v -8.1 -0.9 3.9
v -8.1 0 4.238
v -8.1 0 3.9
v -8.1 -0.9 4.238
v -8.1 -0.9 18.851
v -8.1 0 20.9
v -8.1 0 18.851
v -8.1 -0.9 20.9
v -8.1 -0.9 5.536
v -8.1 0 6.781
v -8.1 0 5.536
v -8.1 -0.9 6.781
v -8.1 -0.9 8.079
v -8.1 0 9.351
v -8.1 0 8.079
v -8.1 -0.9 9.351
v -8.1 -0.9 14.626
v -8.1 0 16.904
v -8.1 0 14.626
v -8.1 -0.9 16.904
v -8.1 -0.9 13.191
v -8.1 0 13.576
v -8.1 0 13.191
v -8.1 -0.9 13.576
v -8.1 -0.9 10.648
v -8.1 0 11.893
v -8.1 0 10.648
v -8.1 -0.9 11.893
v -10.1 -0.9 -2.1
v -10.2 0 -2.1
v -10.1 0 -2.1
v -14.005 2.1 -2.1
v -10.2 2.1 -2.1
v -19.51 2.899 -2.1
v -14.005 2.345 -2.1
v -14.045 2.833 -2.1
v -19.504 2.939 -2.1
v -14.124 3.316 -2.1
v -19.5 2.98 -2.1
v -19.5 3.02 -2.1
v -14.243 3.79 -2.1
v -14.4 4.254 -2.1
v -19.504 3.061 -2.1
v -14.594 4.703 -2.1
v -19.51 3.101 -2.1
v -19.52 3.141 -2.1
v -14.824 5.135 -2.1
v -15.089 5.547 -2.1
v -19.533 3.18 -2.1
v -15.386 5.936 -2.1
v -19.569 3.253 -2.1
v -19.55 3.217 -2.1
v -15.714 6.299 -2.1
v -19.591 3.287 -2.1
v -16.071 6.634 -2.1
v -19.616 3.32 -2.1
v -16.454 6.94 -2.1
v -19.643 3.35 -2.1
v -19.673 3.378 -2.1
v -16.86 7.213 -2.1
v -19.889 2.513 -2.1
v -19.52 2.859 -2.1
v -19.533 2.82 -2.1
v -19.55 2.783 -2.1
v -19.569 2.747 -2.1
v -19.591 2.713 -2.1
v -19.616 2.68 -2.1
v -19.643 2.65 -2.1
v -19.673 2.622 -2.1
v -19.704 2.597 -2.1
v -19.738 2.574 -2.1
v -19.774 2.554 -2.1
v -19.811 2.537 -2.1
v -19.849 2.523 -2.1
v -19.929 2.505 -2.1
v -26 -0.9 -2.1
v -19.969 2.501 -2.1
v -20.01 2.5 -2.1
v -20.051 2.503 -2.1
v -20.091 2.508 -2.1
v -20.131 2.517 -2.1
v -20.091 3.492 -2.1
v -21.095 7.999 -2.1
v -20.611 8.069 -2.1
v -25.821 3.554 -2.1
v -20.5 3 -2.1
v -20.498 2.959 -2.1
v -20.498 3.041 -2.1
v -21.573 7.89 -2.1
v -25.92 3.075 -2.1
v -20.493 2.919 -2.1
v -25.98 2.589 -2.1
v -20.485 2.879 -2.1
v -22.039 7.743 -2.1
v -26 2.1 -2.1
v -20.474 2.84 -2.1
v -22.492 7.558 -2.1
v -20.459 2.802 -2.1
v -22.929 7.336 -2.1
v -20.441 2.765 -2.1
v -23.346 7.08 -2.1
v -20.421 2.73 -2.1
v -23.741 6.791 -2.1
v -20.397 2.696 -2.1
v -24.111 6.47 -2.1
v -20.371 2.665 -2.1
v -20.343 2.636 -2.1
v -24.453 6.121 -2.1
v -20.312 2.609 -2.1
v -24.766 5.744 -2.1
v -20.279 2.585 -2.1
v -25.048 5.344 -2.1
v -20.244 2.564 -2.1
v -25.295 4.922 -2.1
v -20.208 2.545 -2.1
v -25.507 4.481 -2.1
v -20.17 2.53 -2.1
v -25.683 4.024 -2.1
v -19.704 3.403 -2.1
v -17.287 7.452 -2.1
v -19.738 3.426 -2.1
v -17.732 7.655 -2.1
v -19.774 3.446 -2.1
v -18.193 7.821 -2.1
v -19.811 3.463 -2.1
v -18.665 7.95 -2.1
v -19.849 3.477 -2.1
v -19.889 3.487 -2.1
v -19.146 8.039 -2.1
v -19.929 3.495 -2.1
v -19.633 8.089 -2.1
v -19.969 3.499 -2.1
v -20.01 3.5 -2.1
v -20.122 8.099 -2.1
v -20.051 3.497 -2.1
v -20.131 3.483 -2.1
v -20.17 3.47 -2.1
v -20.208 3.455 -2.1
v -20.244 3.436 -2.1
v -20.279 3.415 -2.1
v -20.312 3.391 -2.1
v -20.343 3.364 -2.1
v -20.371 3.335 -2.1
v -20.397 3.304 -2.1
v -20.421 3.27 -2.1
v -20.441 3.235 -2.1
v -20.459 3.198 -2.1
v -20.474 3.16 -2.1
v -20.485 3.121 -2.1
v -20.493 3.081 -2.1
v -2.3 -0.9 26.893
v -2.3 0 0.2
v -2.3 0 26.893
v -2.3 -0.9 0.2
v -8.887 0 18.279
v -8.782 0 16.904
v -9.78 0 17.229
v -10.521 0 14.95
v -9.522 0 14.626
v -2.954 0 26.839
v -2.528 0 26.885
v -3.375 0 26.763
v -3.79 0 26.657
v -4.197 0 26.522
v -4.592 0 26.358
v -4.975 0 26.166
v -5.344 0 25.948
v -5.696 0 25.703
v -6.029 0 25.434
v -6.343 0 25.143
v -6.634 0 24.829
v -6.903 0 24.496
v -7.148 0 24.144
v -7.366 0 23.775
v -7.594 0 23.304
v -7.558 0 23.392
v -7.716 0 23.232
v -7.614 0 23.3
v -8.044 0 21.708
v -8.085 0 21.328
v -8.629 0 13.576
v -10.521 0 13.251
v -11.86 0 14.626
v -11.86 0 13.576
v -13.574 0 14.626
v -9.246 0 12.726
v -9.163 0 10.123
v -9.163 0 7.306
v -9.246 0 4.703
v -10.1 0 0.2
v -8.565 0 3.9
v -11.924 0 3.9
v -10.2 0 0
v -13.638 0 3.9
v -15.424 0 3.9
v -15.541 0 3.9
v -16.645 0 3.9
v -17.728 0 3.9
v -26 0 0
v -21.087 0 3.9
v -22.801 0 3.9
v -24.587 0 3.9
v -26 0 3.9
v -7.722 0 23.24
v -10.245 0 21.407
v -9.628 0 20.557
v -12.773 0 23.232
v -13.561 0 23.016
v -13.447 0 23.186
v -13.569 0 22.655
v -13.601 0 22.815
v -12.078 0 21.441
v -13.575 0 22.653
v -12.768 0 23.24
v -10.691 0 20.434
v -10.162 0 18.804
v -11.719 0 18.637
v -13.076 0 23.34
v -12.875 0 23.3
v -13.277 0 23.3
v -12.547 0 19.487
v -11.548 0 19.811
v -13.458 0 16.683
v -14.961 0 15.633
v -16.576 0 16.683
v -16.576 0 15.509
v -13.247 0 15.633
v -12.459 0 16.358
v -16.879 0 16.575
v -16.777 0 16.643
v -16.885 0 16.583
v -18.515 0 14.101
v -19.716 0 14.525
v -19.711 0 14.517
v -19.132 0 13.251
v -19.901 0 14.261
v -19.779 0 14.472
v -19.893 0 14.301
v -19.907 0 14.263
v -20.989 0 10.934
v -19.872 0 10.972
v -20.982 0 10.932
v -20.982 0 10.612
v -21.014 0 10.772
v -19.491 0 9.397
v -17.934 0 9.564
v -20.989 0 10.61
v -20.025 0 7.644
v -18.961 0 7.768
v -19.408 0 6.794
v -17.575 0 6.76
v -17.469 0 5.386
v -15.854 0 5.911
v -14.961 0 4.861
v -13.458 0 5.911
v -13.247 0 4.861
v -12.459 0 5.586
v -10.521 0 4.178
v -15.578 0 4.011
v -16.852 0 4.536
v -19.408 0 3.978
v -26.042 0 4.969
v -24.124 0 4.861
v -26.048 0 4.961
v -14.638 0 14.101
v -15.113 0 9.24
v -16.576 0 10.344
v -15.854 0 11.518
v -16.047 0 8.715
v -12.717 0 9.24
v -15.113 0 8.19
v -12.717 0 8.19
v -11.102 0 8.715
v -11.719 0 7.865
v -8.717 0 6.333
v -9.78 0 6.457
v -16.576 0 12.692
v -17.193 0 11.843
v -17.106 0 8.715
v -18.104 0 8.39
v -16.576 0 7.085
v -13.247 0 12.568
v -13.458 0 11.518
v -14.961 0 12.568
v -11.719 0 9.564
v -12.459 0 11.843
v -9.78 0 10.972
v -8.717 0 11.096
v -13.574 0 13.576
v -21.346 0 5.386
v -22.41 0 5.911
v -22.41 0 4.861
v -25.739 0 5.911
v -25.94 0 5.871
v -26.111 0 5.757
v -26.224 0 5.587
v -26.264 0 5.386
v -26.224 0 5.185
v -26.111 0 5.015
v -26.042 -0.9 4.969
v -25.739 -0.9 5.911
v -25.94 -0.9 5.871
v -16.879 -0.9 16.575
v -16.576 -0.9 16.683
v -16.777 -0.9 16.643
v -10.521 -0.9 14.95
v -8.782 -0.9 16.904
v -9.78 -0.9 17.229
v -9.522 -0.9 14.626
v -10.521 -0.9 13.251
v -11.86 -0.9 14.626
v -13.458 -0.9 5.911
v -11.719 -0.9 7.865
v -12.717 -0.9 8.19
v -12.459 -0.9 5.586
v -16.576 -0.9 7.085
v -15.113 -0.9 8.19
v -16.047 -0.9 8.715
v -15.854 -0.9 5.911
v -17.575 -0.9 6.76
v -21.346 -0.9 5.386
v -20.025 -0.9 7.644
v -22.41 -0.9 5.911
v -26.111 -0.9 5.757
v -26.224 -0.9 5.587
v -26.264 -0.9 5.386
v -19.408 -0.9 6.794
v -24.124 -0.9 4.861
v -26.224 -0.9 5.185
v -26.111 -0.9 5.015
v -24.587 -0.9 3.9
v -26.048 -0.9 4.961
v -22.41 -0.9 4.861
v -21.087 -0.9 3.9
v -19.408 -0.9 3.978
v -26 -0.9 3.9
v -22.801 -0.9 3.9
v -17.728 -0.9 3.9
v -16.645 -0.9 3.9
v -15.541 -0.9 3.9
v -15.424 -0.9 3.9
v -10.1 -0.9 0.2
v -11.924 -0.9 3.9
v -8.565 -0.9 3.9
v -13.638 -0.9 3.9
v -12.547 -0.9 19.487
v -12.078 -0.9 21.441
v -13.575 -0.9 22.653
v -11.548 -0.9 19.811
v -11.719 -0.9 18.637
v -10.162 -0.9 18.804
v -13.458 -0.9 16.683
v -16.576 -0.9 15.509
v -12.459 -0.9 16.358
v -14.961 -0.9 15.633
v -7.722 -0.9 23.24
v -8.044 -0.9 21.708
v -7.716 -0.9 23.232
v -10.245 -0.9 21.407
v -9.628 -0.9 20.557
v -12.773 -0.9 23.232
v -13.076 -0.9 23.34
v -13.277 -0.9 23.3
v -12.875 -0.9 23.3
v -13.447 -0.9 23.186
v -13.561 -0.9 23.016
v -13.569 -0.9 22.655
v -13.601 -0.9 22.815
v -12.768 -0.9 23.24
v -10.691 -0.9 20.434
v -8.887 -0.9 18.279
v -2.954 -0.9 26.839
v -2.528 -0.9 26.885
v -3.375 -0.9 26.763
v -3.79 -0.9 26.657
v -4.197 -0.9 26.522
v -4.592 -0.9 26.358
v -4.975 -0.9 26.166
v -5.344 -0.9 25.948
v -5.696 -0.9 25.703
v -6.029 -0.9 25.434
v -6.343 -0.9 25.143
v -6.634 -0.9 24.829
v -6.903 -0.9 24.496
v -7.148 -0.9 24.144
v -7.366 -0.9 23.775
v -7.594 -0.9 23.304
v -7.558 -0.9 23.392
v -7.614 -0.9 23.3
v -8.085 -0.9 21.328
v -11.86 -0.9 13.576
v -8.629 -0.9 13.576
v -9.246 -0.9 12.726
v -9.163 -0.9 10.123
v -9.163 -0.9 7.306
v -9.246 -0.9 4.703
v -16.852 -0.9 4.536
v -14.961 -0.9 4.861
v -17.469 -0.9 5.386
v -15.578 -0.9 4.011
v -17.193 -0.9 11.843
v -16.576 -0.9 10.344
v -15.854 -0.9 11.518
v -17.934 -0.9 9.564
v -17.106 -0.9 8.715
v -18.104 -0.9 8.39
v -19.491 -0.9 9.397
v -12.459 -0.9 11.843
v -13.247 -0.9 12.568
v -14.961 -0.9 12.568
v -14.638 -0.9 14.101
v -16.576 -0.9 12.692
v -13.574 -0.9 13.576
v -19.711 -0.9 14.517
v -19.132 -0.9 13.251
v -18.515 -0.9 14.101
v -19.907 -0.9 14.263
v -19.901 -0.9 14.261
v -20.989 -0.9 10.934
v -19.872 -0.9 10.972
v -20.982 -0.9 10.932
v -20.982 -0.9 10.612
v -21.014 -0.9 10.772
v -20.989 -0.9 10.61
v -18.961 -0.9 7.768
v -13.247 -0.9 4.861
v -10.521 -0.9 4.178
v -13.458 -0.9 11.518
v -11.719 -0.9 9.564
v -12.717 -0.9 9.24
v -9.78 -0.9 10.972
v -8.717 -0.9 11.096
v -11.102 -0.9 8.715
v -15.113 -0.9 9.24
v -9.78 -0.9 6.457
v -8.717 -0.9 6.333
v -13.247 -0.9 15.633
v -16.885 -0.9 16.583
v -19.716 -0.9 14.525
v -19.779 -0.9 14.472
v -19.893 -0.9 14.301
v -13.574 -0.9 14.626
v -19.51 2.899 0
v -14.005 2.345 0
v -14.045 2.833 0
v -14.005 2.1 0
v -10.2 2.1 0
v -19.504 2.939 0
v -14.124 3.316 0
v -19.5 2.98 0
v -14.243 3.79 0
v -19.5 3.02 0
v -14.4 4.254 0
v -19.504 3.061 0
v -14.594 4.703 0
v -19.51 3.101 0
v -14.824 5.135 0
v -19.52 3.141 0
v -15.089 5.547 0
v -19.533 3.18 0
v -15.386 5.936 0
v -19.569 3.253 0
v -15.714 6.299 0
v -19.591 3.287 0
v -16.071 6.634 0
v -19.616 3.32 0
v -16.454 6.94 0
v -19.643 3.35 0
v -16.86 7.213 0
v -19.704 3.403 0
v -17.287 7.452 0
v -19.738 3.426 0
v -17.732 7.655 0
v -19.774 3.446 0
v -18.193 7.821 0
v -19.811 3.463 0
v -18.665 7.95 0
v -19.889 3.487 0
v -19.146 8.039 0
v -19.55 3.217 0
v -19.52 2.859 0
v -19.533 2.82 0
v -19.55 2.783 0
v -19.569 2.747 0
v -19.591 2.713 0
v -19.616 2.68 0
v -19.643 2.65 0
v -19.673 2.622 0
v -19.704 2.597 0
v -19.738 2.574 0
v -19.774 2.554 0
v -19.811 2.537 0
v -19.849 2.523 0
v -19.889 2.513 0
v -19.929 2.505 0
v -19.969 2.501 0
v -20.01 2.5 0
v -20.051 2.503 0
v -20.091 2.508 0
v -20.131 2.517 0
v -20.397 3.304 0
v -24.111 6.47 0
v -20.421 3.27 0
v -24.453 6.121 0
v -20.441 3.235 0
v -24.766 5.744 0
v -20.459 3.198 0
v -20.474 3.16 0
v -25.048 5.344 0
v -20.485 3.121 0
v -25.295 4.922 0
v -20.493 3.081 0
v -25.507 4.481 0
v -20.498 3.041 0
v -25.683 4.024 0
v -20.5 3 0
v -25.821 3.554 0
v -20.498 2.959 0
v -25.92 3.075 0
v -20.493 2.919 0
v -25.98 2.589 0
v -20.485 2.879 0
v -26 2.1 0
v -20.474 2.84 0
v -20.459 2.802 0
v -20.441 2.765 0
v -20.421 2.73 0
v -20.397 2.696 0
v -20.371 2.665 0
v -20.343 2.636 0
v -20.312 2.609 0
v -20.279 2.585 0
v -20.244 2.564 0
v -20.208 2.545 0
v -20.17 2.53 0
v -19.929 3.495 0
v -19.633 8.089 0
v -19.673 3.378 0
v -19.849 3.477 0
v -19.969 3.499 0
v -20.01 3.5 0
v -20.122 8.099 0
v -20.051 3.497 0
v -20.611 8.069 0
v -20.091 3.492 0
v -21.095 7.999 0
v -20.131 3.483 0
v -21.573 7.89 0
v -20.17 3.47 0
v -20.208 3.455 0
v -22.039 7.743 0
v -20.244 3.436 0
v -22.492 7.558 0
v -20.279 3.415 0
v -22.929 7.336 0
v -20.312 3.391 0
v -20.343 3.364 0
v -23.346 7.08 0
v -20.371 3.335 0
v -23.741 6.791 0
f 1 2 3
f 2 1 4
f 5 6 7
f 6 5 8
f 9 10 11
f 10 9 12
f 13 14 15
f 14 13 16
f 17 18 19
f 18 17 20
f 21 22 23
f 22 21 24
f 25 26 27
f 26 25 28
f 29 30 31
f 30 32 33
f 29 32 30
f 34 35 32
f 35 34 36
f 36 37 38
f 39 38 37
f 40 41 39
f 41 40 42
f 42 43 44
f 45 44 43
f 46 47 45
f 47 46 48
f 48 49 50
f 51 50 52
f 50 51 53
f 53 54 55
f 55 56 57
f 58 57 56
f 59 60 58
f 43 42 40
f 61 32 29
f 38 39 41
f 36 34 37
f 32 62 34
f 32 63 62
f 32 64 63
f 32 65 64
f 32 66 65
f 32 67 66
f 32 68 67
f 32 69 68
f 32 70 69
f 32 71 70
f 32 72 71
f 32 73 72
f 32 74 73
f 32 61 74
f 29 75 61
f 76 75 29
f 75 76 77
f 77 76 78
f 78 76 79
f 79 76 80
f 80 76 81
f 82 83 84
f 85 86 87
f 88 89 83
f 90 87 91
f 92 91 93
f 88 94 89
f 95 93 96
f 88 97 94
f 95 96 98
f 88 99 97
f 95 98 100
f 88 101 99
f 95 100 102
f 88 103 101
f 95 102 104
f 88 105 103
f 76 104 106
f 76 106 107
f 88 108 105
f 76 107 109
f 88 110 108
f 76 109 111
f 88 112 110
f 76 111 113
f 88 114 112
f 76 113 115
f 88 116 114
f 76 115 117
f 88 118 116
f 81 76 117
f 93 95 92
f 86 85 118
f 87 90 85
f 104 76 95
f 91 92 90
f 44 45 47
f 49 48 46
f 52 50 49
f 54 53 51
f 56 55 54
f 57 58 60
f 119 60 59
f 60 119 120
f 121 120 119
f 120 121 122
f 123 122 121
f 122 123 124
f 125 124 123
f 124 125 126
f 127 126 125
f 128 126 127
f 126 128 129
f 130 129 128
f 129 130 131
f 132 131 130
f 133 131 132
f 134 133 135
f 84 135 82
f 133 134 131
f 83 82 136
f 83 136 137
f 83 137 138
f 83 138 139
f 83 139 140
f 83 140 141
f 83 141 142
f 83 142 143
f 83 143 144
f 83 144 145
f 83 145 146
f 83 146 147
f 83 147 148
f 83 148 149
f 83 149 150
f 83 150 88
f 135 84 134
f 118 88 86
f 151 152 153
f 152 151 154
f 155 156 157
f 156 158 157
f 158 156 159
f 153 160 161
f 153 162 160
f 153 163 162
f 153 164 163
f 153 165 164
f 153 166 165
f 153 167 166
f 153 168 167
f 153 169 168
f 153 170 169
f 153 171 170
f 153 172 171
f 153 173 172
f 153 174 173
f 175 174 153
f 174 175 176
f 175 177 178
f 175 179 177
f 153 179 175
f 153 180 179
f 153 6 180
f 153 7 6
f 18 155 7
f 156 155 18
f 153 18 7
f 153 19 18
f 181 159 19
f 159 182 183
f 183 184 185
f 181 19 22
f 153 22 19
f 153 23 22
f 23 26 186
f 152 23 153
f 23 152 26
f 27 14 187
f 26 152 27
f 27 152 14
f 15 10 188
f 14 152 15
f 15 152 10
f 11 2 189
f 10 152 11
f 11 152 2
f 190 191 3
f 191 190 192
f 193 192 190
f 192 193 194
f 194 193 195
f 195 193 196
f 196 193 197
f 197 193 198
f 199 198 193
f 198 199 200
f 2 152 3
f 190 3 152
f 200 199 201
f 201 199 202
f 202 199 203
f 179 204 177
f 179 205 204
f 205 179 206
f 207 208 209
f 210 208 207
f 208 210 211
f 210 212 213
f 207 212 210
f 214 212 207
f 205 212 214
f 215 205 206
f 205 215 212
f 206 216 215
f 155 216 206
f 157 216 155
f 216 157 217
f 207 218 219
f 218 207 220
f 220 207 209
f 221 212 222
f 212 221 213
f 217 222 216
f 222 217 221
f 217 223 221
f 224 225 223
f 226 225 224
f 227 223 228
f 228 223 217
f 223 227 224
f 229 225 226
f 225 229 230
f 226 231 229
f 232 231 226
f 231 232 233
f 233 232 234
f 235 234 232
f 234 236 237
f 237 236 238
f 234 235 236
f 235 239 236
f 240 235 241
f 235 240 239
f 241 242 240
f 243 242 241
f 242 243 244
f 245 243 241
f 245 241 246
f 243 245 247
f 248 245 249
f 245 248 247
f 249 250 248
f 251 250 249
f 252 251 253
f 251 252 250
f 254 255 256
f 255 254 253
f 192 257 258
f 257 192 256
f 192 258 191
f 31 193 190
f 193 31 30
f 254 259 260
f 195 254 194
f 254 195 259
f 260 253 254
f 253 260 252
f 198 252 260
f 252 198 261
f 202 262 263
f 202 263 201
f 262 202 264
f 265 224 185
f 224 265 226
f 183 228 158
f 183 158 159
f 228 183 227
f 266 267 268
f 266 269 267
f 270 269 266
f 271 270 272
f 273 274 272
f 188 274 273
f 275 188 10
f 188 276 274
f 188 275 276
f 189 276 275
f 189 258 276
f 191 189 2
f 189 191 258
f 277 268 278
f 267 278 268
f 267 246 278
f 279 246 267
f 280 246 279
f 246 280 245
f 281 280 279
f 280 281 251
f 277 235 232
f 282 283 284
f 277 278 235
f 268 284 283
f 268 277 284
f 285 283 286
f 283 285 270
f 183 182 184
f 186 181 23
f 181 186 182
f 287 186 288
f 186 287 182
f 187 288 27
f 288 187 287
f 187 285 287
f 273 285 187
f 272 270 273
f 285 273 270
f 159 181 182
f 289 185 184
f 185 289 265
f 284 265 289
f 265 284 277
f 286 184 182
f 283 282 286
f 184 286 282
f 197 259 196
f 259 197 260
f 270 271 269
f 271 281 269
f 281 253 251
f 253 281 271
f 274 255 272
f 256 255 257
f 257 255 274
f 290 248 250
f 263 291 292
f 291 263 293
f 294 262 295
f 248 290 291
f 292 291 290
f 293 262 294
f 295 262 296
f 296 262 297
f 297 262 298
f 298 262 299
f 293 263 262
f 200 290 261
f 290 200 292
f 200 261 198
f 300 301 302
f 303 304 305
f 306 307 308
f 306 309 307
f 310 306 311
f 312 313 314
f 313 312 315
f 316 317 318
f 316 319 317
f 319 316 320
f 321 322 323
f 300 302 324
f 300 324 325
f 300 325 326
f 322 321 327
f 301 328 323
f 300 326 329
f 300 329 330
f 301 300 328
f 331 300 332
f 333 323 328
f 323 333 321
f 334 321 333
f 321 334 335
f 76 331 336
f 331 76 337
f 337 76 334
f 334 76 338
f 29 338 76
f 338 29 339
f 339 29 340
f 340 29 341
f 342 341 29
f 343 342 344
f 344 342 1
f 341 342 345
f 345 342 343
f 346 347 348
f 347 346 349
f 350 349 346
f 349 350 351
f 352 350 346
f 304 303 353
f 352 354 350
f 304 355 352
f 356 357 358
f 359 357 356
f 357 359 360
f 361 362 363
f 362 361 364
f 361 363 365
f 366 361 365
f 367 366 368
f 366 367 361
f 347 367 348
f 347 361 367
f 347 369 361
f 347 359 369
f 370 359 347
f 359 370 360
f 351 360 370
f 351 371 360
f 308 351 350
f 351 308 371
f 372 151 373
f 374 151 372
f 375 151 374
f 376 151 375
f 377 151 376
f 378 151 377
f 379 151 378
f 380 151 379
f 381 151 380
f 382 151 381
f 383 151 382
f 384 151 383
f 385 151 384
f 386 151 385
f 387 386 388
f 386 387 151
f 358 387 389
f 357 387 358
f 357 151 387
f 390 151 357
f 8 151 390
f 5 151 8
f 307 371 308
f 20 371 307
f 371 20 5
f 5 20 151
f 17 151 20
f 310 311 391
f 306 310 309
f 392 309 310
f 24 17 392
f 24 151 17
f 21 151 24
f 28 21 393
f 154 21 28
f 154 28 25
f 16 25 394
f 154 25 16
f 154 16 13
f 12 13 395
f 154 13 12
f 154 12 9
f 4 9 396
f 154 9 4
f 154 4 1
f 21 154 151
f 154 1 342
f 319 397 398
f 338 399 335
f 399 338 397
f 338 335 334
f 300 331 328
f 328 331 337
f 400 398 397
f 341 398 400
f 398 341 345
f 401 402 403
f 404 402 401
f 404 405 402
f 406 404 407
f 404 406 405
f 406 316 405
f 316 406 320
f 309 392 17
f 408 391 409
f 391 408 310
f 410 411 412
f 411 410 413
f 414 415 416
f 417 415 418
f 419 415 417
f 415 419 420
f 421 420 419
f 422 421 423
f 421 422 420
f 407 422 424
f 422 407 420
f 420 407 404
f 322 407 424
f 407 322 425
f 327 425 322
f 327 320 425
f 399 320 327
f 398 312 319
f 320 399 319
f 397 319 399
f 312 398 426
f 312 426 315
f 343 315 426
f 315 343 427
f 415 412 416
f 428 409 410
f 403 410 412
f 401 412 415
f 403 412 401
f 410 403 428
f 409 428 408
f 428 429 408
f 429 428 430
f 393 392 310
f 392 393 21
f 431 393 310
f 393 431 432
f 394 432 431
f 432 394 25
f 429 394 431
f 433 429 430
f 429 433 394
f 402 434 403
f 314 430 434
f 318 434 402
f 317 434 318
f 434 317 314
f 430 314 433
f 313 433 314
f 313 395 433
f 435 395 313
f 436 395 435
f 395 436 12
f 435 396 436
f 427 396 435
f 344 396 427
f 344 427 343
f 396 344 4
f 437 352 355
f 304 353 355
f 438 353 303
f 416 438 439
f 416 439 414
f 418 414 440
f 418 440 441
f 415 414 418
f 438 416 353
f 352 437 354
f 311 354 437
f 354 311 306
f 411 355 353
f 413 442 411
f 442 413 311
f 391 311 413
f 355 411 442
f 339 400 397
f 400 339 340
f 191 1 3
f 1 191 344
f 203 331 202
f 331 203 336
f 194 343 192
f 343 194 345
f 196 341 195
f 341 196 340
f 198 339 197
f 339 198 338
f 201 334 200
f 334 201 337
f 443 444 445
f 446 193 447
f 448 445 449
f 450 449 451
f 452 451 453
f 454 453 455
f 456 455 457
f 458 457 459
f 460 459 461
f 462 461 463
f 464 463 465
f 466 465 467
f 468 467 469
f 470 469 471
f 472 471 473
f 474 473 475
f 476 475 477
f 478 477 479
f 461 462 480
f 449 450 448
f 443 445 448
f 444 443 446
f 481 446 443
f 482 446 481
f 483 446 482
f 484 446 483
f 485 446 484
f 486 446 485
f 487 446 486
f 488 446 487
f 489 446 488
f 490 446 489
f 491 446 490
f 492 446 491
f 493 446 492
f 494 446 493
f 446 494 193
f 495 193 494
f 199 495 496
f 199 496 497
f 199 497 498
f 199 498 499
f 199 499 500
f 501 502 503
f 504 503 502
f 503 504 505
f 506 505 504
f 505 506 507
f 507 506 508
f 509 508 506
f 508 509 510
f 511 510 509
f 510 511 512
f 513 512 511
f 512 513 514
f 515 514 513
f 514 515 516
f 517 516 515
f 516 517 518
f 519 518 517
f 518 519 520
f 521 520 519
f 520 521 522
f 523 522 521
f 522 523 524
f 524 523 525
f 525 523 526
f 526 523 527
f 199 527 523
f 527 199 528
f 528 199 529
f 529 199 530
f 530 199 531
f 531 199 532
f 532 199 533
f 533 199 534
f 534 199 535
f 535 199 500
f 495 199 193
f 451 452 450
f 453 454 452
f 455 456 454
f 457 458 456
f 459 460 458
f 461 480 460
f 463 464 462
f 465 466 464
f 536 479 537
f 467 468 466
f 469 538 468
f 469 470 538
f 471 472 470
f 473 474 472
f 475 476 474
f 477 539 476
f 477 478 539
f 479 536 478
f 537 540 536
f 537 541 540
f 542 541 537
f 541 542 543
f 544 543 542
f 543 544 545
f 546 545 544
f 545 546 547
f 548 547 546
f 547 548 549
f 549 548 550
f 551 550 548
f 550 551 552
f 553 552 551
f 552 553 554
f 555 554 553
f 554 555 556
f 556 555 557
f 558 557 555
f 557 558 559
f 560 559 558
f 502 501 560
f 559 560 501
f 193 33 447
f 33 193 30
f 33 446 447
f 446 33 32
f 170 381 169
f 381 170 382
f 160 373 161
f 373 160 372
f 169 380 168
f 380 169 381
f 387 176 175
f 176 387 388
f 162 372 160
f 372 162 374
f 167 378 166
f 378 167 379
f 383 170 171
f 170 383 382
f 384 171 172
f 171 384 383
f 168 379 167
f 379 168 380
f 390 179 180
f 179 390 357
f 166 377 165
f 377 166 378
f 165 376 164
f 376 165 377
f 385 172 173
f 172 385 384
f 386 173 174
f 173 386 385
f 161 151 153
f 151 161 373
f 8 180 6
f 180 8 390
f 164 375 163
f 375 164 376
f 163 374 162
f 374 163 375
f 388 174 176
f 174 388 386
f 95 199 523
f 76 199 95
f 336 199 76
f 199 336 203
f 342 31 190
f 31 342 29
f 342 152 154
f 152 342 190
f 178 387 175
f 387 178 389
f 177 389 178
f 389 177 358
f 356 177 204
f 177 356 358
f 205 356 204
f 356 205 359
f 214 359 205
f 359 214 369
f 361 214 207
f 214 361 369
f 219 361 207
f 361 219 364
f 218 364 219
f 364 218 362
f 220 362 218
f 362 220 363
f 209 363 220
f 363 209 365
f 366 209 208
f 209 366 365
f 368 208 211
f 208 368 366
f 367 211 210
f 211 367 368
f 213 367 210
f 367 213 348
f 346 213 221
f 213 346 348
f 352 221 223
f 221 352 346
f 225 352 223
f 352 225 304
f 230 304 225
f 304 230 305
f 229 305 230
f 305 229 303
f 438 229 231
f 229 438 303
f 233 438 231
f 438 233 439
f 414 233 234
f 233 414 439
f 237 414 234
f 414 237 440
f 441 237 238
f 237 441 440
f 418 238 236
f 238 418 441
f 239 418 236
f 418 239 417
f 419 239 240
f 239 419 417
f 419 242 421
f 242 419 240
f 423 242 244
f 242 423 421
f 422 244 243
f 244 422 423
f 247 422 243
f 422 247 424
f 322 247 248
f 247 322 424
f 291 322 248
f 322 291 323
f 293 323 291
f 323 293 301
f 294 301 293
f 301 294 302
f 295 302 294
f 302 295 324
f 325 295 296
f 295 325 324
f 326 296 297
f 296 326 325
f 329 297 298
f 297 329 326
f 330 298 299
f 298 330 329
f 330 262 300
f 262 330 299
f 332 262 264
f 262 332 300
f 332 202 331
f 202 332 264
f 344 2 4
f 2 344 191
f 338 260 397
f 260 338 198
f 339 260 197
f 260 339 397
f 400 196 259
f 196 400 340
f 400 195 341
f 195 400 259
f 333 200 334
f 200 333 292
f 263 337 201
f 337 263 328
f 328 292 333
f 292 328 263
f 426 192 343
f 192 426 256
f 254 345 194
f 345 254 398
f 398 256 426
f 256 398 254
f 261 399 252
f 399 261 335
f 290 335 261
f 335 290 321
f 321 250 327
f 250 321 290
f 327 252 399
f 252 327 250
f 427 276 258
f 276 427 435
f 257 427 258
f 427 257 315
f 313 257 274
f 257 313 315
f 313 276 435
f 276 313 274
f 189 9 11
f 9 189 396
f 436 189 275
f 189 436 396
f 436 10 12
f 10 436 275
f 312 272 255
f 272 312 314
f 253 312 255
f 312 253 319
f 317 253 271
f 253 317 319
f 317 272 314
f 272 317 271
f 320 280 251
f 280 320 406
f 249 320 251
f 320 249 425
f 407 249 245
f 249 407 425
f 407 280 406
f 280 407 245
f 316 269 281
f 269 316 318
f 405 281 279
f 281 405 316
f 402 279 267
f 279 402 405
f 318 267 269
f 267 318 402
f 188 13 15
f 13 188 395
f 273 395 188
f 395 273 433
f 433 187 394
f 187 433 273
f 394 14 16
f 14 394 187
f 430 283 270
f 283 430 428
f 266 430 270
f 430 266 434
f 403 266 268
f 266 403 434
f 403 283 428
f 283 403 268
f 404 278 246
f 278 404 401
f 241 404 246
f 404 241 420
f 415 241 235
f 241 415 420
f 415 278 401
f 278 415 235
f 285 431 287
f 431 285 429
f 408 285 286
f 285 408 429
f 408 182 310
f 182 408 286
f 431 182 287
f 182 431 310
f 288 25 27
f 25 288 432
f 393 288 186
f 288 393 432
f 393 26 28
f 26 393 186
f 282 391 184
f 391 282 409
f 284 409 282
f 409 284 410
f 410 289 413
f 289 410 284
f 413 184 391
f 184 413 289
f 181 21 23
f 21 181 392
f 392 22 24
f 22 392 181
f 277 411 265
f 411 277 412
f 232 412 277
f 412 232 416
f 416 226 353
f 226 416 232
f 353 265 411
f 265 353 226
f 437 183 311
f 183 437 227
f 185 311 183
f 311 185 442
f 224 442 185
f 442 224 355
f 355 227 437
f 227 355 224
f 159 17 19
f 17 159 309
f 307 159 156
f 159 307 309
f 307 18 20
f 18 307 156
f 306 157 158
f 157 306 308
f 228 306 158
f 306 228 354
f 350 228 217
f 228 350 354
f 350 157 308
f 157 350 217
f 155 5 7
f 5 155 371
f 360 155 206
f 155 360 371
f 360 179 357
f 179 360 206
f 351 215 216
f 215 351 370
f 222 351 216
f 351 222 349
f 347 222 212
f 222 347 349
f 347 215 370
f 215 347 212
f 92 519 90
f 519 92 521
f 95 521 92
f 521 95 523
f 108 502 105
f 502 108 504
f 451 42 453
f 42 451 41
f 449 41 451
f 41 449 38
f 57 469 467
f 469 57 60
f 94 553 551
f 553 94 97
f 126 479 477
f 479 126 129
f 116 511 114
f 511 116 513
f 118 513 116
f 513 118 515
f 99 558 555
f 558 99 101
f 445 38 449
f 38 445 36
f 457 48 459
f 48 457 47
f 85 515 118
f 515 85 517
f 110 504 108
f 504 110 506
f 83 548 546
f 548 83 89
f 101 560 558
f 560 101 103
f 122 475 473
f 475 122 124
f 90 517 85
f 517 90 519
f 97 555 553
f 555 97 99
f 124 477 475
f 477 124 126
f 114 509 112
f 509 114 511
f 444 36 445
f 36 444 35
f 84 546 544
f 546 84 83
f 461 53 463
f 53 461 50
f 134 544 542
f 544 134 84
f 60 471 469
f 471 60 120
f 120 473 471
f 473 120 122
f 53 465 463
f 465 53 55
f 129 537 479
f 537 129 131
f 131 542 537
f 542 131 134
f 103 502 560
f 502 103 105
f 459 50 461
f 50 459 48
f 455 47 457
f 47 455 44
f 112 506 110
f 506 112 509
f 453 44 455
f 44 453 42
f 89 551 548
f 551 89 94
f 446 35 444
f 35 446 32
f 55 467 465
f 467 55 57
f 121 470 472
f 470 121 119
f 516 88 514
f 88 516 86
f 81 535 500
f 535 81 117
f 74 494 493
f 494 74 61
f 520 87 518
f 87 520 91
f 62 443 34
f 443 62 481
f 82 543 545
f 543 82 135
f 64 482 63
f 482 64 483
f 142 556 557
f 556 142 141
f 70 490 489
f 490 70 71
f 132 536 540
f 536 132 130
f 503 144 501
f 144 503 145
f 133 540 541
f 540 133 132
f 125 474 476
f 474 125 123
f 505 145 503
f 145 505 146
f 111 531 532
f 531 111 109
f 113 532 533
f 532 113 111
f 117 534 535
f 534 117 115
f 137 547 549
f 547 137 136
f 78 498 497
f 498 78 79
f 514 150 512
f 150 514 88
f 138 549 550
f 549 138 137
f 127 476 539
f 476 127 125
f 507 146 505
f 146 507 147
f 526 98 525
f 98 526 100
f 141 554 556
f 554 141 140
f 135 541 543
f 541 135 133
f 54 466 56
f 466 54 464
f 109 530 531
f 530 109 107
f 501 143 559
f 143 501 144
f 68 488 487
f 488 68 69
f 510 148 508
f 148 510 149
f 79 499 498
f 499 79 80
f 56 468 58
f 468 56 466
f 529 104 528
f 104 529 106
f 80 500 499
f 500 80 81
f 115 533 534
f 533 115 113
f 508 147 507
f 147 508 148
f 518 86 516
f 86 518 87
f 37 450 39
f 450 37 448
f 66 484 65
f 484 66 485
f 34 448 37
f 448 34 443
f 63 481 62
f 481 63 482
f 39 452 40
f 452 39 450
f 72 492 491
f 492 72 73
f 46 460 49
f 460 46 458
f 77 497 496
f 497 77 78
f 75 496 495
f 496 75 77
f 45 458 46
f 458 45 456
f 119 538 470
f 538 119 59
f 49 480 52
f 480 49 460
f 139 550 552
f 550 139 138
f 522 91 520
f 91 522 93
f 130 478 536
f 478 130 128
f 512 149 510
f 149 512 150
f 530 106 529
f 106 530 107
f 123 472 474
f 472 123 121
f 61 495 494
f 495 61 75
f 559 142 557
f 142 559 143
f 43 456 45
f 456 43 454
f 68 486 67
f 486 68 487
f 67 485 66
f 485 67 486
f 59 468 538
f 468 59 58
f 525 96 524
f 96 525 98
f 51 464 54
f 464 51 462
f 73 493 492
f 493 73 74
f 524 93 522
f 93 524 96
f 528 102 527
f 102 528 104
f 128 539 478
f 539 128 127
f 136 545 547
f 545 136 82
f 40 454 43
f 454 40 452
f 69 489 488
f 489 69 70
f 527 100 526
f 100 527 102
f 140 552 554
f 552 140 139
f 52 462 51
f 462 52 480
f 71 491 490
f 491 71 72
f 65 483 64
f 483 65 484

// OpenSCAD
// file: ../Parts/rounder.scad
// rounder.scad
// cutting tool for rounding off corners with a cylinder

//---------------------
module rounder(
r=10,   // radius
h=10,   // height
f=22,    // $fn
extra=0.01  // extra size for the cube
){

difference(){
  translate([-extra,-extra,-extra])
  cube([r+extra,r+extra,h+2*extra]);
  translate([r,r,-1])
  cylinder(r=r,h=h+2,$fn=f);
}

}

//---------------------------------------------------------------------------
module bevel(x=1,y=1,h=10){

linear_extrude(height=h)
polygon(points=[[0,0],[x,0],[0,y]]);
    
}
  

//========================

rounder();

//========================
// main file
//=================================================================================
// boxSmall.scad
//
// For Fairy Crystal storage box.
// Rework to make interlocking parts
//
// Dr Tom Flint, 4 Jan 2023
//
//  -> Shrink the size of the retainer tabs on the rails, then shrink the postBall
//  -> Medium box top can be a single part, should look super clean
//
//=================================================================================

use <../Parts/rounder.scad>
use <../Parts/threads.scad>
use <../Gears/gears.scad>
use <../Fractals/Lsystem.scad>


r1=4;   // radius of knob
$fn=8;

// small box
xbox=76;  
ybox=50.5;  
ztop=25;
zbase=29;
zfoot=10;
baseScale=0.35;
baseWide=0.3;
railThick=2.1;
railWide=6;
panelThick=0.9;
panelCut=-50;
gap=0.1;


//-----------------------------------------------------------------------------------
module top2(){

extra=2.0;

    // front rail
    difference(){
      union(){
        // front rail
        translate([-xbox-railThick,-ybox-railThick, zbase+ztop-railWide+railThick])
        cube([2*xbox+2*railThick,railThick,railWide]);
        translate([-xbox-railThick,-ybox-railThick, zbase+ztop])
        cube([2*xbox+2*railThick,railWide,railThick]);

        // left rail
        translate([-xbox-railThick,-ybox-railThick, zbase+ztop-railWide+railThick])
        cube([railThick,2*ybox+2*railThick,railWide]);
        translate([-xbox-railThick,-ybox-railThick, zbase+ztop])
        cube([railWide,2*ybox+2*railThick,railThick]);
        
        // left front post
        translate([-xbox-railThick,-ybox-railThick, zbase])
        cube([railWide,railThick,ztop-railWide+railThick]);
        translate([-xbox-railThick,-ybox-railThick, zbase])
        cube([railThick,railWide,ztop-railWide+railThick]);

        // right front post
        mirror([1,0,0]){
          translate([-xbox-railThick,-ybox-railThick, zbase])
          cube([railWide,railThick,ztop-railWide+railThick]);
          translate([-xbox-railThick,-ybox-railThick, zbase])
          cube([railThick,railWide,ztop-railWide+railThick]);
        }

        // backside 
        rotate([0,0,180]){
          // front rail
          translate([-xbox-railThick,-ybox-railThick, zbase+ztop-railWide+railThick])
          cube([2*xbox+2*railThick,railThick,railWide]);
          translate([-xbox-railThick,-ybox-railThick, zbase+ztop])
          cube([2*xbox+2*railThick,railWide,railThick]);

          // left rail
          translate([-xbox-railThick,-ybox-railThick, zbase+ztop-railWide+railThick])
          cube([railThick,2*ybox+2*railThick,railWide]);
          translate([-xbox-railThick,-ybox-railThick, zbase+ztop])
          cube([railWide,2*ybox+2*railThick,railThick]);
          
          // left front post
          translate([-xbox-railThick,-ybox-railThick, zbase])
          cube([railWide,railThick,ztop-railWide+railThick]);
          translate([-xbox-railThick,-ybox-railThick, zbase])
          cube([railThick,railWide,ztop-railWide+railThick]);

          // right front post
          mirror([1,0,0]){
            translate([-xbox-railThick,-ybox-railThick, zbase])
            cube([railWide,railThick,ztop-railWide+railThick]);
            translate([-xbox-railThick,-ybox-railThick, zbase])
            cube([railThick,railWide,ztop-railWide+railThick]);
          }
        }
      }
      // front bevel
      translate([-xbox-railThick,-ybox-railThick-railWide, zbase+ztop+1*railThick])
      rotate([-45,0,0])
      cube([2*xbox+2*railThick,railWide,railWide]);

      // left bevel
      translate([-xbox-railThick-railWide,-ybox-railThick, zbase+ztop+1*railThick])
      rotate([0,45,0])
      cube([railWide,2*ybox+2*railThick,railWide]);

      // left front post bevel
      translate([-xbox-1.25*railThick,-ybox-railThick-railWide, zbase-railWide+railThick])
      rotate([0,0,45])
      cube([railWide,railWide,ztop+railWide]);

      // right front post bevel
      mirror([1,0,0]){
        translate([-xbox-1.25*railThick,-ybox-railThick-railWide, zbase-railWide+railThick])
        rotate([0,0,45])
        cube([railWide,railWide,ztop+railWide]);
      }

      rotate([0,0,180]){
        // front bevel
        translate([-xbox-railThick,-ybox-railThick-railWide, zbase+ztop+1*railThick])
        rotate([-45,0,0])
        cube([2*xbox+2*railThick,railWide,railWide]);

        // left bevel
        translate([-xbox-railThick-railWide,-ybox-railThick, zbase+ztop+1*railThick])
        rotate([0,45,0])
        cube([railWide,2*ybox+2*railThick,railWide]);

        // left front post bevel
        translate([-xbox-1.25*railThick,-ybox-railThick-railWide, zbase-railWide+railThick])
        rotate([0,0,45])
        cube([railWide,railWide,ztop+railWide]);

        // right front post bevel
        mirror([1,0,0]){
          translate([-xbox-1.25*railThick,-ybox-railThick-railWide, zbase-railWide+railThick])
          rotate([0,0,45])
          cube([railWide,railWide,ztop+railWide]);
        }
      }
    }      
}    


//-----------------------------------------------------------------------------------
module base1(){
  
  // front left
  postBase();
  panel();
  
  translate([-xbox,-ybox,0])
  rotate([0,0,-90])
  mirror([1,0,0])
  translate([xbox,ybox,0])
  panel();
  
if(1){  
  // front right
  mirror([1,0,0]){
    postBase();
    panel();

    translate([-xbox,-ybox,0])
    rotate([0,0,-90])
    mirror([1,0,0])
    translate([xbox,ybox,0])
    panel();
  }
  
  // rear is rotation of front
  rotate([0,0,180]){
    postBase();
    panel();
    
    translate([-xbox,-ybox,0])
    rotate([0,0,-90])
    mirror([1,0,0])
    translate([xbox,ybox,0])
    panel();
    
    mirror([1,0,0]){
      postBase();
      panel();

      translate([-xbox,-ybox,0])
      rotate([0,0,-90])
      mirror([1,0,0])
      translate([xbox,ybox,0])
      panel();
    }
  }
}

}

//--------------------------------------------------------------------------------------
module postBase(){

gap=0.1;

  difference(){
    union(){
      // post along base
      translate([-xbox-railThick,-ybox-railThick, 0])
      cube([railWide,railThick,zbase]);
      translate([-xbox-railThick,-ybox-railThick, 0])
      cube([railThick,railWide,zbase]);
      // feet
      translate([-xbox-railThick,-ybox-railThick, -zfoot])
      cube([2*railWide,railThick,zfoot]);
      translate([-xbox-railThick,-ybox-railThick, -zfoot])
      cube([railThick,2*railWide,zfoot]);
      // backside fillet
      translate([-xbox,-ybox, -zfoot])
      rotate([0,0,0])
      rounder(r=4,h=zfoot,f=55);
      // nailing tab
      translate([-xbox-railThick,-ybox-railThick,-railThick])
      cube([2*railWide,2*railWide,railThick]);
    }
    // bevel cut
    translate([-xbox-1.0*railThick,-ybox-railThick-railWide, -zfoot-1])
    rotate([0,0,45])
    cube([railWide,railWide,zbase+zfoot+1]);
    // front cut for panels
    translate([-xbox+railThick,-ybox-panelThick-0.1, 0])
    cube([railWide,panelThick+0.1,zbase]);
    // side cut for panels
    translate([-xbox-panelThick-0.1,-ybox+railThick, 0])
    cube([panelThick+0.1,railWide,zbase]);
    // cuts on feet
    translate([-xbox-railThick+2*railWide,-ybox+railThick, -zfoot])
    rotate([90,0,0])
    scale([0.7,1,1])
    cylinder(r=zfoot-railThick,h=10,$fn=99);
    translate([-xbox-2*railThick,-ybox+2*railWide-railThick, -zfoot])
    rotate([0,90,0])
    scale([1,0.7,1])
    cylinder(r=zfoot-railThick,h=10,$fn=99);

    // nailing tab
    translate([-xbox+railThick,-ybox+railThick,-railThick])
    cylinder(r=0.4,h=10,center=true,$fn=44);
    translate([-xbox+2*railWide-railThick,-ybox+2*railWide-railThick,-railThick-1])
    rotate([0,0,180])
    rounder(r=1.5*railWide,h=10,f=66);
  
  }

}

//--------------------------------------------------------------------------------------
module panel(){

  // frame
  difference(){
    union(){
      translate([-xbox+railThick+0.2,-ybox-panelThick, -railThick])
      cube([railWide-0.2,panelThick,zbase]);
      translate([-xbox+railThick+0.2,-ybox-panelThick, -railThick])
      cube([zbase+railThick-0.2,panelThick,railWide]);
      // bottom lip
      translate([-xbox+2*railThick+railWide,-ybox, -railThick])
      cube([zbase+railThick-railWide,railThick,railThick]);
    }
    translate([panelCut,-ybox-10,-railThick-1])
    cube([xbox+panelCut,20,railWide+2]);
    
    translate([-xbox+railWide+railThick,-ybox+1,zbase-railThick])
    rotate([90,0,0])
    rotate([0,0,180])
    rounder(r=railWide,h=10,f=88);
    
    // nailing tab of the post
    translate([-xbox-railThick,-ybox-railThick,-railThick])
    cube([2*railWide+0.2,2*railWide,railThick+0.2]);

  }
  
  // fractal
  intersection(){
    translate([-xbox,-ybox-panelThick,0])
    rotate([-90,0,0])
    linear_extrude(height=panelThick)
    scale([10*baseScale,10*baseScale])
    penrose_tiling(n=4, w=0.3);   // Recommended n <= 6

    translate([-xbox+railWide,-ybox-2*panelThick,railWide-2*railThick])
    cube([zbase-railWide,3*panelThick,zbase-railWide]);
  }

  // tab for nailing
  difference(){
    intersection(){
      translate([-xbox+14,-ybox, -railThick])
      cube([2*railWide,2*railWide,railThick]);
      translate([-xbox+14+railWide,-ybox+railThick, -railThick])
      cylinder(r=railWide,h=railThick,$fn=77);
    }
    translate([-xbox+14+railWide,-ybox+railWide/2, -railThick])
    cylinder(r=0.5,h=3*railThick,$fn=77);
  }
  
}


//-----------------------------------------------------------------------------------
module boxTop(a=0,tol=0){

translate([-xbox-tol,-ybox-tol,zbase-tol])
translate([0,-2,0])
rotate([a,0,0])
translate([0,2,0])
cube([2*xbox+2*tol,2*ybox+2*tol,ztop+2*tol]);

// front latch
translate([0,ybox+5,zbase+15/2])
cube([30,10,15],center=true);

// back hinges
translate([40,-ybox-5,zbase+15/2])
cube([30,5,15],center=true);
translate([-40,-ybox-5,zbase+15/2])
cube([30,5,15],center=true);

}

//-----------------------------------------------------------------------------------
module boxBase(tol=0){

translate([0,0,zbase/2])
cube([2*xbox+2*tol,2*ybox+2*tol,zbase+2*tol],center=true);

// front latch
translate([0,ybox+5,zbase-24/2])
cube([30,10,24],center=true);

// back hinges
translate([40,-ybox-5,zbase-15/2])
cube([30,5,15],center=true);
translate([-40,-ybox-5,zbase-15/2])
cube([30,5,15],center=true);

}

//================================================================================


//railFront();
//railSide();
//postTop();
//postBall();

//color("cyan")
//translate([xbox,ybox,0])
//postBase();
mirror([1,0,0])
translate([xbox,ybox,0])
panel();

if(0){
  color("cyan")
  boxTop(a=0);

  color("green")
  boxBase();
}

if(0){
//  top1();
  top2();
//  base1();
}

//================================================================================
